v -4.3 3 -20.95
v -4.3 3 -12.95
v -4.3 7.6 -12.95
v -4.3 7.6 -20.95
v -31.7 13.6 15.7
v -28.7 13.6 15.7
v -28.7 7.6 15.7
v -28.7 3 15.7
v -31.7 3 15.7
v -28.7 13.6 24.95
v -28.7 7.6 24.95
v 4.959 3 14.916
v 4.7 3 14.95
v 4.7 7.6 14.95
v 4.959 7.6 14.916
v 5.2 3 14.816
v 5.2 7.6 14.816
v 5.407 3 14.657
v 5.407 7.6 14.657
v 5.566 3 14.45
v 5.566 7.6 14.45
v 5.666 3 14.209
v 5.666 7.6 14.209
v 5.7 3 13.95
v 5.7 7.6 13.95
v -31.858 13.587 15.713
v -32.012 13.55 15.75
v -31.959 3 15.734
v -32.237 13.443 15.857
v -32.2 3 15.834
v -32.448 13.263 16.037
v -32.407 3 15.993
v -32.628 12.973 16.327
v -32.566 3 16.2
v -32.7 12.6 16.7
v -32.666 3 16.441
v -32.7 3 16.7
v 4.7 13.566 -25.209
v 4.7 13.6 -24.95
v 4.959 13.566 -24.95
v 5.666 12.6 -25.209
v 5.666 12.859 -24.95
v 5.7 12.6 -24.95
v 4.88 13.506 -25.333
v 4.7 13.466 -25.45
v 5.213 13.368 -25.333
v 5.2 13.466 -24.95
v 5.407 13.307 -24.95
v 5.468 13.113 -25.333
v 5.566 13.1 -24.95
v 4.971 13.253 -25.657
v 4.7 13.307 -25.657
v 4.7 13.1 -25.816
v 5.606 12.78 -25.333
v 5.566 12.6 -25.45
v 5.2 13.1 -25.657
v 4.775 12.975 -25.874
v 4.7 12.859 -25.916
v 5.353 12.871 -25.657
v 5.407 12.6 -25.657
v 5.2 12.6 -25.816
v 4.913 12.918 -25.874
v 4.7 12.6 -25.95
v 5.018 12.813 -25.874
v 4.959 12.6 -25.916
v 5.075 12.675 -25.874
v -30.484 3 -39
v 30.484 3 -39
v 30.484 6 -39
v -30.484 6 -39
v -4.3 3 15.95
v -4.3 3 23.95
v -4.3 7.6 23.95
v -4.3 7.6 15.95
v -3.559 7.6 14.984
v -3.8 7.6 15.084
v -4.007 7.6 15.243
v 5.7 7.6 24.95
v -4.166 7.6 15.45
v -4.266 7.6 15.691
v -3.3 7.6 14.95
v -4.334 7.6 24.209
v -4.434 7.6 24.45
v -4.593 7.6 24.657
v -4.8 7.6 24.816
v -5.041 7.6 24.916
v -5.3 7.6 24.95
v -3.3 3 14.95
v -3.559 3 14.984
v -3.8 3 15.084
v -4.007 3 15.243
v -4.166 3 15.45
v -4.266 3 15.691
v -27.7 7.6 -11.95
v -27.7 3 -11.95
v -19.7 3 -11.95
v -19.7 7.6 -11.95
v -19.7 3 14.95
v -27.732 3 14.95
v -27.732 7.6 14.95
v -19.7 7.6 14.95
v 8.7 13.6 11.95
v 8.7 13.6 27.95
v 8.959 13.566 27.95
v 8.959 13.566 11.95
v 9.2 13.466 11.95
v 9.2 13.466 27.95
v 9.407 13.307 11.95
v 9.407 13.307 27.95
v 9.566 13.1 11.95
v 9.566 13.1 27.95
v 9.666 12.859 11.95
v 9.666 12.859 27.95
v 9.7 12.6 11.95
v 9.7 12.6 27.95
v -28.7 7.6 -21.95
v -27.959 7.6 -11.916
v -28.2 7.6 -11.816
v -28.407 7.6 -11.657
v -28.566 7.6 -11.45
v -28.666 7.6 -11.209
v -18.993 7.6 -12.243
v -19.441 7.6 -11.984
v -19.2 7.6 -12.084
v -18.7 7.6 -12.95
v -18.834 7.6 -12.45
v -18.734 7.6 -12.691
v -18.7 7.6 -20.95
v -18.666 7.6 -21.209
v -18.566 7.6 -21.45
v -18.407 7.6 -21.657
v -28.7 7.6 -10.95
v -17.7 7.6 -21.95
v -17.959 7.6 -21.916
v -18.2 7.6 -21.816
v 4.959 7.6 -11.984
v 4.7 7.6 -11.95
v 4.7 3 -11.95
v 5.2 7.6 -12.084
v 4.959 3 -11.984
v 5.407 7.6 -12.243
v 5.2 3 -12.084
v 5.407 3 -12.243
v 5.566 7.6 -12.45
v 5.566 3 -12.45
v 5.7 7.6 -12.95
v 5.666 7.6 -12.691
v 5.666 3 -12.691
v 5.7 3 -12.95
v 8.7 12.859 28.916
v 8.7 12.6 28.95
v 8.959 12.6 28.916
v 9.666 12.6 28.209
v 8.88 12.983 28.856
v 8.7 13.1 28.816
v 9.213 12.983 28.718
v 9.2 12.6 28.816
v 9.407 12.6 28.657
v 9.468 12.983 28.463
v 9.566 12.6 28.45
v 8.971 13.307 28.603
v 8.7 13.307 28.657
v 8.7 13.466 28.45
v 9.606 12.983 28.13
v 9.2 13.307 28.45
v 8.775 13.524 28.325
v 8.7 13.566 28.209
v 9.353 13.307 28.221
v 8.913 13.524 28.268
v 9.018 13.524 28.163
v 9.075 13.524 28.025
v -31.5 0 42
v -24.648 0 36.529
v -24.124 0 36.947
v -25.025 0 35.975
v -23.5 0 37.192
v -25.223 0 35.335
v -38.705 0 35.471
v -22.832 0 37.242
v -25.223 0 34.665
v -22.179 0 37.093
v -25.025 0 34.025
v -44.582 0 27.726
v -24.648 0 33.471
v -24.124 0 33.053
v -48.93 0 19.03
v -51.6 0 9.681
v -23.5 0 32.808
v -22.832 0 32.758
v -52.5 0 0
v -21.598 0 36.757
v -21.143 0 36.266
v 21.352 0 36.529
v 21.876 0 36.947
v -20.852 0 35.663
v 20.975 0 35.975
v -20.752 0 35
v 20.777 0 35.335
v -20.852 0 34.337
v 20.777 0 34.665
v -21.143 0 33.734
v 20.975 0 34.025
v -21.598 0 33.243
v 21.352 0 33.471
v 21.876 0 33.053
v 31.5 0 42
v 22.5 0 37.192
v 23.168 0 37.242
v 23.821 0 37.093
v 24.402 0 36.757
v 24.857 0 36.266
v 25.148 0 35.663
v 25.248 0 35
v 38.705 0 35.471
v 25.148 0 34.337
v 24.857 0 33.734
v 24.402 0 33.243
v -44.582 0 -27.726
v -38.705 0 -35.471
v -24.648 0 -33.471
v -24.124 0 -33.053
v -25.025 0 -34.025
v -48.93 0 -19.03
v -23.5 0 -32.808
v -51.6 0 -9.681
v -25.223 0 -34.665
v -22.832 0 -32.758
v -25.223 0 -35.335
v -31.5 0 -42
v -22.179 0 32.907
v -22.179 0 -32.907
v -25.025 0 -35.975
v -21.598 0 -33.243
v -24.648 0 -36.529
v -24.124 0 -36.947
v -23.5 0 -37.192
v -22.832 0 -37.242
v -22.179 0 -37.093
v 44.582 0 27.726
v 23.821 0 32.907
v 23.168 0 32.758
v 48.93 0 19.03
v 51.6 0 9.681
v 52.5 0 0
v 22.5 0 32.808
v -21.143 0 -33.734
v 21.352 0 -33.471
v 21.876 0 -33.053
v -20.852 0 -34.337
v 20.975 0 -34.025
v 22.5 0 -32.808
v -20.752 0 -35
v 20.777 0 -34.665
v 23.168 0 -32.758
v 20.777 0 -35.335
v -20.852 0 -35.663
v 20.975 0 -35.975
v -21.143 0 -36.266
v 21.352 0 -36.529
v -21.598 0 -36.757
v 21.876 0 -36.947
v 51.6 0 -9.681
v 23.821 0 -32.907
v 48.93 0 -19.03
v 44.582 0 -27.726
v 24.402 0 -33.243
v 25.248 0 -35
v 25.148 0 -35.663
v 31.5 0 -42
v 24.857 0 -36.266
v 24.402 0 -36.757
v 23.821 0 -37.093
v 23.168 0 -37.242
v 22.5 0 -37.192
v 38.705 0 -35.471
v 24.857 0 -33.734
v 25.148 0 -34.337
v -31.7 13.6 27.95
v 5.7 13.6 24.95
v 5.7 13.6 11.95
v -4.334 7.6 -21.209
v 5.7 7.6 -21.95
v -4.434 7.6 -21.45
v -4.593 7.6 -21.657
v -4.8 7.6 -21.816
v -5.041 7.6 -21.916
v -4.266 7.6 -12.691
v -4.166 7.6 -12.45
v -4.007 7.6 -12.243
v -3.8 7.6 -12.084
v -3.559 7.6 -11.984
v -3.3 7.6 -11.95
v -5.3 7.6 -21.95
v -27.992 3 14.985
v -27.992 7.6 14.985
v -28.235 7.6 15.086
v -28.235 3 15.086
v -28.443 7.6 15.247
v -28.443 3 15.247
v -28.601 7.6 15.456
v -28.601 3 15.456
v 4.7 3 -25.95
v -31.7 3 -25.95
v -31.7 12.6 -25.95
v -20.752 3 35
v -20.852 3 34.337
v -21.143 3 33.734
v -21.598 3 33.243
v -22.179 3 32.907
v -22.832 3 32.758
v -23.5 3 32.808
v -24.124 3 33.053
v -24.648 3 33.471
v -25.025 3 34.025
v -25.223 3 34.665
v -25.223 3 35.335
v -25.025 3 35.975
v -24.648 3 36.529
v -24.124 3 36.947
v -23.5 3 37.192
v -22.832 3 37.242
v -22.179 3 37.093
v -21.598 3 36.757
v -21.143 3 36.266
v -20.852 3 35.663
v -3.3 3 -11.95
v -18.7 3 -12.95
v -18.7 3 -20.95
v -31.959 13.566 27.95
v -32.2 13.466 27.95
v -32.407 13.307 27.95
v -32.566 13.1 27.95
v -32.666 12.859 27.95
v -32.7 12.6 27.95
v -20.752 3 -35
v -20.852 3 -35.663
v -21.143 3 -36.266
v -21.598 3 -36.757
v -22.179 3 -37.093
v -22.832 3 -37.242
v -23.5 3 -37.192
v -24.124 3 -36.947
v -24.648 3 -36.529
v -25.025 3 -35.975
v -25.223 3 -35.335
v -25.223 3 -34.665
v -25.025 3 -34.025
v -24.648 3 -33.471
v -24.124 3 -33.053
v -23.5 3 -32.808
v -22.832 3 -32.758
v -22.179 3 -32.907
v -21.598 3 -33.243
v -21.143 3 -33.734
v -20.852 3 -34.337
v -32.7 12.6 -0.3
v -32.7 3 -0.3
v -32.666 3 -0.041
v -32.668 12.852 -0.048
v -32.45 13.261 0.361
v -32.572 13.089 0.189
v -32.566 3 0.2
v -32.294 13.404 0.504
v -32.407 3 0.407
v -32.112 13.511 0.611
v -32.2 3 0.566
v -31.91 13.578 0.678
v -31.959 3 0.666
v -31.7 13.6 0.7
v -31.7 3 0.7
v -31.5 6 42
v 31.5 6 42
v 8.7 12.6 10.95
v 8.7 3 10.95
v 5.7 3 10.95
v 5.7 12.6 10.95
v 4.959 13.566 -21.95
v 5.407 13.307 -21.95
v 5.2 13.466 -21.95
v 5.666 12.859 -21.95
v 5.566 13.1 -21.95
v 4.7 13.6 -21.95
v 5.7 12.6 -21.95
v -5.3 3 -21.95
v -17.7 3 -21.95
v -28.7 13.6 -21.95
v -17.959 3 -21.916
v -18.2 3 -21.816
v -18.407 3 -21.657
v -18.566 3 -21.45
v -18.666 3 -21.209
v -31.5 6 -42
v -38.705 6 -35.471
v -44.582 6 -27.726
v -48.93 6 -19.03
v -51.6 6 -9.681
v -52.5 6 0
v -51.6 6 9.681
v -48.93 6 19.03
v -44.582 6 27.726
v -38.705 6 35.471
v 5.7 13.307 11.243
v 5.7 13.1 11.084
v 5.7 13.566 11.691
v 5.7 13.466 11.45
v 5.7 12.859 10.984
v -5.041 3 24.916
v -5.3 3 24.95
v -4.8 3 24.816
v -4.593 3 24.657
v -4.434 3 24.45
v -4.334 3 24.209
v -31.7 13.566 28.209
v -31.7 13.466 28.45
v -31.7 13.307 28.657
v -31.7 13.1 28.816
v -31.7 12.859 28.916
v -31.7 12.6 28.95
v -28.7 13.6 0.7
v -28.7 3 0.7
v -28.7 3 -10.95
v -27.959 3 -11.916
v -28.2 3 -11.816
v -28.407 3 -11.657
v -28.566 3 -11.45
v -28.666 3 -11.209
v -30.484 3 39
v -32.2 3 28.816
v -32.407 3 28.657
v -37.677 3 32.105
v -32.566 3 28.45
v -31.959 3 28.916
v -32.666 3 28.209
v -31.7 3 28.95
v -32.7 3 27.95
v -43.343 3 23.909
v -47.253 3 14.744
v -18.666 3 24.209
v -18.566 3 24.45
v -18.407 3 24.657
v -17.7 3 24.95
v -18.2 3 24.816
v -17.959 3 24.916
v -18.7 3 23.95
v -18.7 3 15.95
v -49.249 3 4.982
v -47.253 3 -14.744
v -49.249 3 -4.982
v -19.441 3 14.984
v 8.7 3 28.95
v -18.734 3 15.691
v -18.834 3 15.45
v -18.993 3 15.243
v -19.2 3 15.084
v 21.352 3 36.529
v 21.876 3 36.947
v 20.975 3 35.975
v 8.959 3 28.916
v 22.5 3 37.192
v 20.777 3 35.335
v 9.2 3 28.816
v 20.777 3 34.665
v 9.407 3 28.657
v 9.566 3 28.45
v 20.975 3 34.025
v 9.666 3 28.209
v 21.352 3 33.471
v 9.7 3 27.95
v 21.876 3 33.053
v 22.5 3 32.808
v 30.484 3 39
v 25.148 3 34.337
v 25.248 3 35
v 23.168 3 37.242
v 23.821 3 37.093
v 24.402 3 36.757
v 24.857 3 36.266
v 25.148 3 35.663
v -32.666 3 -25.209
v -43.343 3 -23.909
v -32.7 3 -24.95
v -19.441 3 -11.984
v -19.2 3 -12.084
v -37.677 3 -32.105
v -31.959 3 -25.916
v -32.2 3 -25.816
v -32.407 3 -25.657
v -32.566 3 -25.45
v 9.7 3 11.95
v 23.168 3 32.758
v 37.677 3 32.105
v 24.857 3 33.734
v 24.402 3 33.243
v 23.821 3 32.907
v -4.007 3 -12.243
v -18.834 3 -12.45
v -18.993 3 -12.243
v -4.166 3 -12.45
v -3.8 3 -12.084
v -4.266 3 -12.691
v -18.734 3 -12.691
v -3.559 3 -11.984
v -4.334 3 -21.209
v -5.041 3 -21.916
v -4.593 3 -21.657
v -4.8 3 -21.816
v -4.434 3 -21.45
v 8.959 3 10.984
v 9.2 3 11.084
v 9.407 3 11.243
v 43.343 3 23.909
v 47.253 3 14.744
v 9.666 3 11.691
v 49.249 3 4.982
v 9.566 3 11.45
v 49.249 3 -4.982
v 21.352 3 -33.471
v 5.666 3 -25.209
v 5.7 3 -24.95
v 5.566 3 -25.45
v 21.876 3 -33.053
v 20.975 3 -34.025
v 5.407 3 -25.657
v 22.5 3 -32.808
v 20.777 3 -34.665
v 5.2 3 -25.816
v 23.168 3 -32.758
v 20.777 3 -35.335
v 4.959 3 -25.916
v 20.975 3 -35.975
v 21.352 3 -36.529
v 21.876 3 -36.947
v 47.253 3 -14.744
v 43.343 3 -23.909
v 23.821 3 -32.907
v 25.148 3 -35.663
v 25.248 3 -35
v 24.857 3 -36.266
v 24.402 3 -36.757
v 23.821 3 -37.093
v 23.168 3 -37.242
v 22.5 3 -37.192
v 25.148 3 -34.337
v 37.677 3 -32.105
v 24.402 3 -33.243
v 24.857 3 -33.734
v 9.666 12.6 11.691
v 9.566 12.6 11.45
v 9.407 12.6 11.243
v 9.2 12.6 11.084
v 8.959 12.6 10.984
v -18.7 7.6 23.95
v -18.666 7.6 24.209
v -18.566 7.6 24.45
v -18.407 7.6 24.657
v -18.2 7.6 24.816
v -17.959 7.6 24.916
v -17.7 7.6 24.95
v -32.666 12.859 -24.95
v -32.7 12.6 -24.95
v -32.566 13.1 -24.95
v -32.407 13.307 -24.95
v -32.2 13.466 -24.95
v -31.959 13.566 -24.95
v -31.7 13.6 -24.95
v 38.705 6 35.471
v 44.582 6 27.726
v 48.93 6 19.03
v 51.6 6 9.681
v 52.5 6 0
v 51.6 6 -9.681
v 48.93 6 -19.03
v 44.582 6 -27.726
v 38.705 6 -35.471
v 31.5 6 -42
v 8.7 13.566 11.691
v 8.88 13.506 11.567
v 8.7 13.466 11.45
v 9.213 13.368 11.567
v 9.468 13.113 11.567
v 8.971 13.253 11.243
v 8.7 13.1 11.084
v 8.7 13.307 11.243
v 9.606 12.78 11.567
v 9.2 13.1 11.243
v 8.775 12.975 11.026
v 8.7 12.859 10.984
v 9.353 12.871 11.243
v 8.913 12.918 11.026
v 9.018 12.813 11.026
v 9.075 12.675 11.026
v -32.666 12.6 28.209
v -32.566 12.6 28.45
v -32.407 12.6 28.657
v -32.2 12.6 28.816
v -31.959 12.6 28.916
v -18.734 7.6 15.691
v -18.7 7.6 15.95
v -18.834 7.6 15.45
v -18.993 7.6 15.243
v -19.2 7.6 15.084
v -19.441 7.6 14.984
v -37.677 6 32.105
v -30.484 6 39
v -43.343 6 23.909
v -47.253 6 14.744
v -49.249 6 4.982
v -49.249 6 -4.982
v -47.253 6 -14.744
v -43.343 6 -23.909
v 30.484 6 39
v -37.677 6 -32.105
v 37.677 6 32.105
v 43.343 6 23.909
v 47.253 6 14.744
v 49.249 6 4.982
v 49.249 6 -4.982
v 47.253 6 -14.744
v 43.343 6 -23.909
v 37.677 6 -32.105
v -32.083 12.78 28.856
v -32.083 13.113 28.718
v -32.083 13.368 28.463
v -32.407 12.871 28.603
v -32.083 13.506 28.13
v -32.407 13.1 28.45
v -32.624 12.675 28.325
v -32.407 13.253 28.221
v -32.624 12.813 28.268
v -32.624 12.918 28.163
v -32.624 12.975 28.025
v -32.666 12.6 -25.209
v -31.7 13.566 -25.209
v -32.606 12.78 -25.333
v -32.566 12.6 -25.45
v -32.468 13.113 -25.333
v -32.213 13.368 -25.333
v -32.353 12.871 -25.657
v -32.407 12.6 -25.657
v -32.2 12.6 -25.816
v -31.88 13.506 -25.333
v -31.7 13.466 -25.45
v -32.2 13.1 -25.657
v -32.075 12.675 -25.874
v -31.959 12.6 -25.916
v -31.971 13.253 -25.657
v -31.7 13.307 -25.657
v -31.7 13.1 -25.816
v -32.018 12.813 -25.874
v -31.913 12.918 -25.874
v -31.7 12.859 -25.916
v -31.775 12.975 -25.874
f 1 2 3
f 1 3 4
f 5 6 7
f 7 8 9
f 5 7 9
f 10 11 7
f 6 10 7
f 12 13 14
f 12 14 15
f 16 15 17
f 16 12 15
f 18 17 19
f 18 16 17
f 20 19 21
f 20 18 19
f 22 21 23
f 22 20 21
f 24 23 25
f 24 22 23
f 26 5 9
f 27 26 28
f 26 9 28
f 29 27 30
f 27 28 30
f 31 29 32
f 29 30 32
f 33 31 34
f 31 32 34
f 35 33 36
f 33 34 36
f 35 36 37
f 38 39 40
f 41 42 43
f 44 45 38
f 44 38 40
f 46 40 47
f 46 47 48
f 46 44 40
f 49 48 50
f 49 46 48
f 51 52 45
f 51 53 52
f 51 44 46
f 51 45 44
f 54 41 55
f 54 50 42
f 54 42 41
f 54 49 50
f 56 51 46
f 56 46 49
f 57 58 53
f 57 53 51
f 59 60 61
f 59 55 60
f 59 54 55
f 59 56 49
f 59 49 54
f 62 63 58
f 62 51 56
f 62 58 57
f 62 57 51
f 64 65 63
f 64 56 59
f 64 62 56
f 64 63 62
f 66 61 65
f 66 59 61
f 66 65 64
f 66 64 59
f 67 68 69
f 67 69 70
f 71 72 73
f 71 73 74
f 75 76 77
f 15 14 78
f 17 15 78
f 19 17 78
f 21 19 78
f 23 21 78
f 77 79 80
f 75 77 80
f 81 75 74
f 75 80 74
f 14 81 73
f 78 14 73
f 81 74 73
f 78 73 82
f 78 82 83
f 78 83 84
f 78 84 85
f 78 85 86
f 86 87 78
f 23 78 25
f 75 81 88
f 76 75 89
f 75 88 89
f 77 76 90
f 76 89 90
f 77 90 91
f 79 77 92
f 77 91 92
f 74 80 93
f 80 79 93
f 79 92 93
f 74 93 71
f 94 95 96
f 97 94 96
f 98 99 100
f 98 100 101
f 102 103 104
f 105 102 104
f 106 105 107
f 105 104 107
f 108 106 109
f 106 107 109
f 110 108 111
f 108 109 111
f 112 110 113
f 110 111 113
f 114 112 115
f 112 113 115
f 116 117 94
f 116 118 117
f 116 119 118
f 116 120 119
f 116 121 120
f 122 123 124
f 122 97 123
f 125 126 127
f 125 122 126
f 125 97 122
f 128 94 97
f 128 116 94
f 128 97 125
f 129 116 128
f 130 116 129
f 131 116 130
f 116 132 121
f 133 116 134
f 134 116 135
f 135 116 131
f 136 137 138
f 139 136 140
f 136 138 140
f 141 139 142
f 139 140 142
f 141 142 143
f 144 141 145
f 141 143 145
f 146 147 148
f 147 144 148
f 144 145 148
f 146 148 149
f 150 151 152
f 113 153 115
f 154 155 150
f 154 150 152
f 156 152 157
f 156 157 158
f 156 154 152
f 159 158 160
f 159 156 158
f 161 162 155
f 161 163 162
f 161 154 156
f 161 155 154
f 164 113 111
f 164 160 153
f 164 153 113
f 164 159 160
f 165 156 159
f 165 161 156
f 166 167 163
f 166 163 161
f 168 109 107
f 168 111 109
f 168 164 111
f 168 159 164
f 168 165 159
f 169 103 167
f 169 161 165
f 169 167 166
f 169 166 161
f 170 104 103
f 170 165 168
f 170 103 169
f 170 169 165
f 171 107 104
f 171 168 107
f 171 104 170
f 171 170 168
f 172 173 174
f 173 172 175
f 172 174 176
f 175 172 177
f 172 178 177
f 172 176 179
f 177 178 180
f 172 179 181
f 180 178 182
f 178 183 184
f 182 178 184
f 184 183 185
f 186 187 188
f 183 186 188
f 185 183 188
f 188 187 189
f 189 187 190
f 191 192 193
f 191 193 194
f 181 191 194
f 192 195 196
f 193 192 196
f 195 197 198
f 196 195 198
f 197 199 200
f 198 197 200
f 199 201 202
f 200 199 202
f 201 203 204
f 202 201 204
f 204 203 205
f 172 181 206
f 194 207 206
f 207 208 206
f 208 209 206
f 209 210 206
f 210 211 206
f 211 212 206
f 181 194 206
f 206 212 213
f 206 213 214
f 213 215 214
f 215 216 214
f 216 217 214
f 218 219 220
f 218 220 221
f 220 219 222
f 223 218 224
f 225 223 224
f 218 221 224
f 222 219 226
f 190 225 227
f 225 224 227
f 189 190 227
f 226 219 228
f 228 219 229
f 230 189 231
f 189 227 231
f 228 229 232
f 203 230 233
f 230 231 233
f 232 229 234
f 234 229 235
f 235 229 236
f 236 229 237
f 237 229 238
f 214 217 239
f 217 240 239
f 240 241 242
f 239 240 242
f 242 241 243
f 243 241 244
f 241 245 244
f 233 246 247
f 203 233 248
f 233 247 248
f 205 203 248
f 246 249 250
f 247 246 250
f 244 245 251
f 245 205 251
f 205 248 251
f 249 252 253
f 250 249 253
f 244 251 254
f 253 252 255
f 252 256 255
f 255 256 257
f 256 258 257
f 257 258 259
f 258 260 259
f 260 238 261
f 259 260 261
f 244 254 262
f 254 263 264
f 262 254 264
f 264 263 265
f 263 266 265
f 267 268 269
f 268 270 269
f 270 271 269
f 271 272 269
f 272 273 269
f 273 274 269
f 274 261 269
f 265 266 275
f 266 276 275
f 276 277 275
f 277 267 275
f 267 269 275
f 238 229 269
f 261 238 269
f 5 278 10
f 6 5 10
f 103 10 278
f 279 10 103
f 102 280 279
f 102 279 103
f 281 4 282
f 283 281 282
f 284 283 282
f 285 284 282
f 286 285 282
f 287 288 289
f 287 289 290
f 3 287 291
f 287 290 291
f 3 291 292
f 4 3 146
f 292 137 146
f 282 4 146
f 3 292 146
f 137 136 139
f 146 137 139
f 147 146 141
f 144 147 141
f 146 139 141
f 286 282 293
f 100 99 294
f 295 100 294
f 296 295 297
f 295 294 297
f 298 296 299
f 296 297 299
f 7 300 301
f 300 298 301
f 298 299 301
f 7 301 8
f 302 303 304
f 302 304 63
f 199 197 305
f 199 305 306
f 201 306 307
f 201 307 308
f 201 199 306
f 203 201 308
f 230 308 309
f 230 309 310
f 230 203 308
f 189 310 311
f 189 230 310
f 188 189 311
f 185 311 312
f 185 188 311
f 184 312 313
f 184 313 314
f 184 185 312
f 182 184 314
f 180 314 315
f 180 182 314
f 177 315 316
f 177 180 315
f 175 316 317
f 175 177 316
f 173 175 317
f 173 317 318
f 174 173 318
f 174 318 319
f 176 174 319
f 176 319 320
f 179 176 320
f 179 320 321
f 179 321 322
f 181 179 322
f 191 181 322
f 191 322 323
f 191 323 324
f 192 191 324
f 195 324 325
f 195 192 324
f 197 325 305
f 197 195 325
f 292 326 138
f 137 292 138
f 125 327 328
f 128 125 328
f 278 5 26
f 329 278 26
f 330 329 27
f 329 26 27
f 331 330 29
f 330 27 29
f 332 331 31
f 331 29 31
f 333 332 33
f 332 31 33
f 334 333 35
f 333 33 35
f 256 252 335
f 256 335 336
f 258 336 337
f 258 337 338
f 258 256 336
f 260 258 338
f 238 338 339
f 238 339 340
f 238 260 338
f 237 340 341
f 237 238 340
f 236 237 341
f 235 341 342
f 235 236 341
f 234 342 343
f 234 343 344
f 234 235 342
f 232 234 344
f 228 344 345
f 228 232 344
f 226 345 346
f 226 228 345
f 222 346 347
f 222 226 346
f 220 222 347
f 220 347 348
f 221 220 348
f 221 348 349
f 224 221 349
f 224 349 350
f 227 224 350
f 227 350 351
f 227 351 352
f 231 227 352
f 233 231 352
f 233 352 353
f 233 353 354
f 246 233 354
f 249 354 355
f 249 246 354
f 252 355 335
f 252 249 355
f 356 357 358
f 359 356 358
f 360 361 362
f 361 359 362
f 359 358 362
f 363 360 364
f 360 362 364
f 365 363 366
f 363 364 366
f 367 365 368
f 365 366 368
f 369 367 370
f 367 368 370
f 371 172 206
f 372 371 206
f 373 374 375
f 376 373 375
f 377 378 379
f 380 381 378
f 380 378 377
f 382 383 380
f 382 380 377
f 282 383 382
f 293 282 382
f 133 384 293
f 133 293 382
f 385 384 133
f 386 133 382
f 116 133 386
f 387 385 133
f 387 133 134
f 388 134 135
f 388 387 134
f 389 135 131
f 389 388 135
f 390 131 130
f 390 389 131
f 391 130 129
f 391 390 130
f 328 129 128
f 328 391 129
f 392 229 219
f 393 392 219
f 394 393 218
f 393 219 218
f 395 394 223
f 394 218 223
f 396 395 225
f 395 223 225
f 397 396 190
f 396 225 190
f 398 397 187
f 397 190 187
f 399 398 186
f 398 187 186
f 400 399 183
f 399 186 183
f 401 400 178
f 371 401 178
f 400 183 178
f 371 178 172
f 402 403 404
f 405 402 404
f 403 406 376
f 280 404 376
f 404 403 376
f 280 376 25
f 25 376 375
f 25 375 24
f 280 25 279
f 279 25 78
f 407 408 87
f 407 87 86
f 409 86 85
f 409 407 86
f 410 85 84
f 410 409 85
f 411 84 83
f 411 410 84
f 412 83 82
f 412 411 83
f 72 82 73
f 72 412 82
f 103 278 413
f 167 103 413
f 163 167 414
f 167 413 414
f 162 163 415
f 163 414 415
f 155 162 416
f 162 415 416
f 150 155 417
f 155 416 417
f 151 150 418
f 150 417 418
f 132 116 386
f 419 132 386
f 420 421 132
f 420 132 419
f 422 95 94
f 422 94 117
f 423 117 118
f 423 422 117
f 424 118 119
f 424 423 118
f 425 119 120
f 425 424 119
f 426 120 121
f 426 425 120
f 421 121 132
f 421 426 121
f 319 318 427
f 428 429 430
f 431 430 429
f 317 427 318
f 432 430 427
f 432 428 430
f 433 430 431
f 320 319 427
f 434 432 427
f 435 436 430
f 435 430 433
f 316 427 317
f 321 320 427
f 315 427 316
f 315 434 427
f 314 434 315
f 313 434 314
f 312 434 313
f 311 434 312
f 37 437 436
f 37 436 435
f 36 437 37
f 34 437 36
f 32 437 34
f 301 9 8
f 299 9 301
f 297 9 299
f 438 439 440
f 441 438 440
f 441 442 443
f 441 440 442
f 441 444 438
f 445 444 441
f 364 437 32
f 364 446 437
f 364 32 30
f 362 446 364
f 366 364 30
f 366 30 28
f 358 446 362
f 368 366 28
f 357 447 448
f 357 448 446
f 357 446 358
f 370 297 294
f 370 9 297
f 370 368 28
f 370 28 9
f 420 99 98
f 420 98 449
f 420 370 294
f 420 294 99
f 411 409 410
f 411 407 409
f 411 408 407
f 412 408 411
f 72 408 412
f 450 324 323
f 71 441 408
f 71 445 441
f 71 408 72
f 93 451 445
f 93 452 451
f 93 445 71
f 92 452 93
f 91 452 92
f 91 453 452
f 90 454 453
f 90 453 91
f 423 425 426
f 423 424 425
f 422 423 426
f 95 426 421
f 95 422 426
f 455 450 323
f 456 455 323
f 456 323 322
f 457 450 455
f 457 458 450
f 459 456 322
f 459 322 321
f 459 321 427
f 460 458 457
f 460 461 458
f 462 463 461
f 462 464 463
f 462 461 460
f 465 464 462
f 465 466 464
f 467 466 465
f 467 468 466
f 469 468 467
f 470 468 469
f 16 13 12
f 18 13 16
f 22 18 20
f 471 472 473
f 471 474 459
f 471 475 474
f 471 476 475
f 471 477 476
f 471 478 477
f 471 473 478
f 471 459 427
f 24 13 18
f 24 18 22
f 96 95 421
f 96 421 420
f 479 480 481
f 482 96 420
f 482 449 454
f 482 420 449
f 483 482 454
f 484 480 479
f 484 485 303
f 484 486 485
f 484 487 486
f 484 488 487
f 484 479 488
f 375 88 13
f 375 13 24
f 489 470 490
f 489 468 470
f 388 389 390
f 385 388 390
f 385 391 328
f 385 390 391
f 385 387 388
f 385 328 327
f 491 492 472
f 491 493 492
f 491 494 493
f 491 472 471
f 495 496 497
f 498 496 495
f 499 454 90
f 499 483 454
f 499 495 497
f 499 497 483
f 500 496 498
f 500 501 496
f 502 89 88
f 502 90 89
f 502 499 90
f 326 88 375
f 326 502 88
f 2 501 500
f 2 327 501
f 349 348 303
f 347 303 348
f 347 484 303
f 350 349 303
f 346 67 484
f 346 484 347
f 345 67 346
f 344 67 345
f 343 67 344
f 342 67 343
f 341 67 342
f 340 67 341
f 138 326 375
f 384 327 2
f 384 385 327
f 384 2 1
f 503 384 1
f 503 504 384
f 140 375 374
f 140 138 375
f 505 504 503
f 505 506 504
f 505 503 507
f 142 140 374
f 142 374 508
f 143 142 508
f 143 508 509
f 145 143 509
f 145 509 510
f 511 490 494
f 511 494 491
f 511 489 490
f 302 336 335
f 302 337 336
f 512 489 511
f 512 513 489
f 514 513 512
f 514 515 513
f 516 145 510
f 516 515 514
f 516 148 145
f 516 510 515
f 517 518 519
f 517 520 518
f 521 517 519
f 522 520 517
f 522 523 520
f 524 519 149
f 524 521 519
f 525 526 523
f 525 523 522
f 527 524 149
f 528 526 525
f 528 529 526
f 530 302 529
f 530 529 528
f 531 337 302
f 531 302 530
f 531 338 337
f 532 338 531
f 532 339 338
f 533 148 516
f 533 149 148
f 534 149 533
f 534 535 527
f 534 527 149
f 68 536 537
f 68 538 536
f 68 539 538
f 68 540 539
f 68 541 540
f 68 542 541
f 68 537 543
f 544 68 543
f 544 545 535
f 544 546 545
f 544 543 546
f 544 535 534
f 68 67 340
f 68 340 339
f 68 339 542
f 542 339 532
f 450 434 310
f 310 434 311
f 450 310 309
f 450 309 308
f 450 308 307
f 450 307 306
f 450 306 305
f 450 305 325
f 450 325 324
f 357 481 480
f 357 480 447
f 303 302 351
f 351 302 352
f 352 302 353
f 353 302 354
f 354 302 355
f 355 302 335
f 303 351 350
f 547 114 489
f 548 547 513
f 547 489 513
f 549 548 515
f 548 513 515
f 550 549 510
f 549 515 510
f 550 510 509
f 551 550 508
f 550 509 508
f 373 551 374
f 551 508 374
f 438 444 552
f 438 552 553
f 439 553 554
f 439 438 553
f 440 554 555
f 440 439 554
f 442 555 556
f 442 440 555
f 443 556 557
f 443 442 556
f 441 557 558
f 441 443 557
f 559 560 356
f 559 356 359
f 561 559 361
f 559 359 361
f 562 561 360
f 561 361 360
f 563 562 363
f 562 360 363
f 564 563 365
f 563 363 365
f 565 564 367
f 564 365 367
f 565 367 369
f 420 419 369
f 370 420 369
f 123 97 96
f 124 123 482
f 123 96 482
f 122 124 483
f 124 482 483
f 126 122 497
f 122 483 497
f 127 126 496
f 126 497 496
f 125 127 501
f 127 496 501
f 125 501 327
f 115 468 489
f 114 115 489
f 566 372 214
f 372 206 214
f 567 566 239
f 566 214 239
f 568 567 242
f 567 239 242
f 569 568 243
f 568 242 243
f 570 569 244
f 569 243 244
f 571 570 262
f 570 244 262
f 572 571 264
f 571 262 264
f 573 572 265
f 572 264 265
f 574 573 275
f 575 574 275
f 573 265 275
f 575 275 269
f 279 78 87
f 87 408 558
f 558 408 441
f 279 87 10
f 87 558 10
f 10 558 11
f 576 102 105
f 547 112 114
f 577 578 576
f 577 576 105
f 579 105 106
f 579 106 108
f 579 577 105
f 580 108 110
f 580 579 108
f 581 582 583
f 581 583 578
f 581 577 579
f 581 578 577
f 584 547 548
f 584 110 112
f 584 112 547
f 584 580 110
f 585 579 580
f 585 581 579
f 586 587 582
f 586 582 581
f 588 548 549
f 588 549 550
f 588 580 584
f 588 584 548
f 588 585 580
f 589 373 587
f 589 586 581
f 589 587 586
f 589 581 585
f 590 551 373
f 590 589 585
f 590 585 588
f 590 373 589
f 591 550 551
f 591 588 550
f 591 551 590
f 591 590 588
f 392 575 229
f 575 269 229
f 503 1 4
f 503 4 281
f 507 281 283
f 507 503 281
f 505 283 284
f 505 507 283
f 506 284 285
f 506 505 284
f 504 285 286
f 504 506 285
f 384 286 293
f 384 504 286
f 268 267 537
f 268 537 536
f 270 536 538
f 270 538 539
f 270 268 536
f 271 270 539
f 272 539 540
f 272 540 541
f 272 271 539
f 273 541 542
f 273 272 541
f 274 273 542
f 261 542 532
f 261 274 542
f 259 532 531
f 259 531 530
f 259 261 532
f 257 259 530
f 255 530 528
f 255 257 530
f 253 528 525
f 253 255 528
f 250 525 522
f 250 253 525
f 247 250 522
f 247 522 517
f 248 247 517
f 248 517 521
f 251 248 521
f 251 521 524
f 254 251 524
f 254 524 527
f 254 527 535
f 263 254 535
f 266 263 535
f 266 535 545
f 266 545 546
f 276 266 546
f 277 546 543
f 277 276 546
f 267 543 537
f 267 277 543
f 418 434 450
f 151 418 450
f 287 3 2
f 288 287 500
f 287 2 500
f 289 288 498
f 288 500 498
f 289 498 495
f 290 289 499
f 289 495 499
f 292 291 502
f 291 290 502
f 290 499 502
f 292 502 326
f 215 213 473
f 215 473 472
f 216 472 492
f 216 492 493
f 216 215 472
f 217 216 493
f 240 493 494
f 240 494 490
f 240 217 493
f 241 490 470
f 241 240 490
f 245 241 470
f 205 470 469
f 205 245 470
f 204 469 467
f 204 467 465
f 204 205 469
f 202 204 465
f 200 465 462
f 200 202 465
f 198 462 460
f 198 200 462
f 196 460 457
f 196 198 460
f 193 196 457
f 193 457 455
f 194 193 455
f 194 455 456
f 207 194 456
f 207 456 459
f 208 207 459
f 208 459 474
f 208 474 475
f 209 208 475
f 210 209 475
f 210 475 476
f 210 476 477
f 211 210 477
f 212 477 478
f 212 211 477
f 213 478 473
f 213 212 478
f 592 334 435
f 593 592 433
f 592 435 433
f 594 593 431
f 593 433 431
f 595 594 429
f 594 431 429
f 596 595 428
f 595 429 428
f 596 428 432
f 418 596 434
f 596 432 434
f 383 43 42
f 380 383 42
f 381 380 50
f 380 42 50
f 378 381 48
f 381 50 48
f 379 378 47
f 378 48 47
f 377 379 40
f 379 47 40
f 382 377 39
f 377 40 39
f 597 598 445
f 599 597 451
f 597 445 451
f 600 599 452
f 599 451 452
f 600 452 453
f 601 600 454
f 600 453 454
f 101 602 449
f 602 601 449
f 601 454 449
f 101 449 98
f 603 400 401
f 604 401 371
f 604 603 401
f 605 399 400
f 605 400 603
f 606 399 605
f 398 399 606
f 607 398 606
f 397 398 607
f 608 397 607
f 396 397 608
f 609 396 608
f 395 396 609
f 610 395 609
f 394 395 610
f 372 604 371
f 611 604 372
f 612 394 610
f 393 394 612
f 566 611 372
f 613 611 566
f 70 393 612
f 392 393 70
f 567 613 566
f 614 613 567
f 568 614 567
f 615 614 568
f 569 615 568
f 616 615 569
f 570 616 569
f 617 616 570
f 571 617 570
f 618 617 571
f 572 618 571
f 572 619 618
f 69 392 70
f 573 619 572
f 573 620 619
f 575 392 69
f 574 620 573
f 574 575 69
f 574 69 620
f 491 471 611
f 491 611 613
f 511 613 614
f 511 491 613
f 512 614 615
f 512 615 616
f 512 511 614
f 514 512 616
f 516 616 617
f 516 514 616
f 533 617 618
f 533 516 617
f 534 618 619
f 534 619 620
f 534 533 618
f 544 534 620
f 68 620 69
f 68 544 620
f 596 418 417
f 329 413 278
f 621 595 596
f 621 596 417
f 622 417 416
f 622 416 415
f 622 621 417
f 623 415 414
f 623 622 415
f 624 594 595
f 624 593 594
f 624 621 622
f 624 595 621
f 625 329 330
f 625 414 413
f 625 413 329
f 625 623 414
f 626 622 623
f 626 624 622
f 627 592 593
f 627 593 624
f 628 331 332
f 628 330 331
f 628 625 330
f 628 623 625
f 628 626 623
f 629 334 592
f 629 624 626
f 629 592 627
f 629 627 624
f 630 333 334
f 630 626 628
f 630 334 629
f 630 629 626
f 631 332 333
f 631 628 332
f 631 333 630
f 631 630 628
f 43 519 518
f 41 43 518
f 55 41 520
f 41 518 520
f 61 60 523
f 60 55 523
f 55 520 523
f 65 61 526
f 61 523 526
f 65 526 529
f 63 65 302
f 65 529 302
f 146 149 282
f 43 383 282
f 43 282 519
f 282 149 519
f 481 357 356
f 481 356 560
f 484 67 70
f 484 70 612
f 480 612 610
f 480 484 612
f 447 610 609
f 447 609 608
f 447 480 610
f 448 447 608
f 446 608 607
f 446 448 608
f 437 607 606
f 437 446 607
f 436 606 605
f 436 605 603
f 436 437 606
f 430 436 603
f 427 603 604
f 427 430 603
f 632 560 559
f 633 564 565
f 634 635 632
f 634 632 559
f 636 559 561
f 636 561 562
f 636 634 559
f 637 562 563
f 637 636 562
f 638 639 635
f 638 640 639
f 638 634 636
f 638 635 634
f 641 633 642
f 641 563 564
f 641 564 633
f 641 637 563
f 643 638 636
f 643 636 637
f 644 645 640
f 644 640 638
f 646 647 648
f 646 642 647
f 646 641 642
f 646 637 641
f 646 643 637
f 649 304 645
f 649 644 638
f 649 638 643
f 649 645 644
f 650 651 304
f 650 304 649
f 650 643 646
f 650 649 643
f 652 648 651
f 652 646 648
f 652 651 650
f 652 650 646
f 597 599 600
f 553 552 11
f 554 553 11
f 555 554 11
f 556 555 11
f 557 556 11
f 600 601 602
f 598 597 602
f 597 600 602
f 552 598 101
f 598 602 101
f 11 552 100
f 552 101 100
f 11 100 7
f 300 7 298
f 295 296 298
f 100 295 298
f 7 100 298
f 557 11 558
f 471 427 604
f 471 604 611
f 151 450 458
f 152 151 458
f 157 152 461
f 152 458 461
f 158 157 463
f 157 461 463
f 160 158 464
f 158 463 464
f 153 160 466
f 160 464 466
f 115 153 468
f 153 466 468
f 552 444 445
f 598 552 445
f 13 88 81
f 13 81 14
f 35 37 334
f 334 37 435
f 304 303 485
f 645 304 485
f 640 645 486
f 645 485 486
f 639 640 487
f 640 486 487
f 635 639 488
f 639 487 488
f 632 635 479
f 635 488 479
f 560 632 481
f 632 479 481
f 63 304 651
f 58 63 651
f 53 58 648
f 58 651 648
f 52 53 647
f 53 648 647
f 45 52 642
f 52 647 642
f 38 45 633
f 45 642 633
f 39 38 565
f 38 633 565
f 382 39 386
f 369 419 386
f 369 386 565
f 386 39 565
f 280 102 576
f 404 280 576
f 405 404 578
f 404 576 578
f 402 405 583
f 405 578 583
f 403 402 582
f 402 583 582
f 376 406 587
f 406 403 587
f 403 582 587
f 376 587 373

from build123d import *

# Parameters (mm, degrees)
A_BASE_T42_OUTLINE_R       = 2.2479
A_BASE_T42_OUTLINE_R_2     = 1
A_BASE_T42_DEPTH           = 3
OUTER_BRIM_DEPTH           = 3
SKETCH5_W                  = 3
SKETCH5_H                  = 15
SKETCH5_W_2                = 15
SKETCH5_H_2                = 3
BASE_SUPPORTS_DEPTH        = 3
BASE_SUPPORTS_CHAMFER_SIZE = 3
COVER_START                = -3
SKETCH6_R                  = 1
COVER_DEPTH                = 3
SKETCH9_W                  = 15
SKETCH9_H                  = 6
SKETCH9_W_2                = 6
SKETCH9_H_2                = 15
CUT_EXTRUDE1_DEPTH         = 10
SKETCH10_W                 = 10
SKETCH10_H                 = 10
BOSS_EXTRUDE1_DEPTH        = 4.6
BOSS_EXTRUDE2_DEPTH        = 10.6
FILLET1_R                  = 1


with BuildPart() as part:
    # a_base_t42: read off the stored shape, not the designer's step
    # a_base_t42 outline → a_base_t42 (new body)
    with BuildSketch(Plane(origin=(0, 0, 0), x_dir=(1, 0, 0), z_dir=(0, 1, 0))):
        with BuildLine():
            ThreePointArc((31.5, -42), (52.5, 0), (31.5, 42))
            Line((31.5, 42), (-31.5, 42))
            ThreePointArc((-31.5, 42), (-52.5, 0), (-31.5, -42))
            Line((-31.5, -42), (31.5, -42))
        make_face()
        with Locations((-23, -35)):
            Circle(A_BASE_T42_OUTLINE_R, mode=Mode.SUBTRACT)
        with Locations((23, -35)):
            Circle(A_BASE_T42_OUTLINE_R, mode=Mode.SUBTRACT)
        with Locations((-40.25, 0)):
            Circle(A_BASE_T42_OUTLINE_R_2, mode=Mode.SUBTRACT)
        with Locations((-23, 35)):
            Circle(A_BASE_T42_OUTLINE_R, mode=Mode.SUBTRACT)
        with Locations((40.25, 0)):
            Circle(A_BASE_T42_OUTLINE_R_2, mode=Mode.SUBTRACT)
        with Locations((23, 35)):
            Circle(A_BASE_T42_OUTLINE_R, mode=Mode.SUBTRACT)
    extrude(amount=A_BASE_T42_DEPTH)

    # Sketch1 → Outer Brim (add)
    with BuildSketch(Plane(origin=(0, 3, 0), x_dir=(1, 0, 0), z_dir=(0, 1, 0))):
        with BuildLine():
            Line((-31.5, -42), (31.5, -42))
            ThreePointArc((31.5, -42), (52.5, 0), (31.5, 42))
            Line((31.5, 42), (-31.5, 42))
            ThreePointArc((-31.5, 42), (-52.5, 0), (-31.5, -42))
        make_face()
        with BuildLine():
            Line((30.483602149, 39), (-30.483602149, 39))
            ThreePointArc((-30.483602149, 39), (-49.5, 0), (-30.483602149, -39))
            Line((-30.483602149, -39), (30.483602149, -39))
            ThreePointArc((30.483602149, -39), (49.5, 0), (30.483602149, 39))
        make_face(mode=Mode.SUBTRACT)
    extrude(amount=OUTER_BRIM_DEPTH)

    # Sketch5 → Base Supports (add)
    with BuildSketch(Plane(origin=(0, 3, 0), x_dir=(1, 0, 0), z_dir=(0, 1, 0))):
        with Locations((-34.325, -12.5)):
            Rectangle(SKETCH5_W, SKETCH5_H)
        with Locations((-34.325, 12.5)):
            Rectangle(SKETCH5_W, SKETCH5_H)
        with Locations((-25.325, -27)):
            Rectangle(SKETCH5_W_2, SKETCH5_H_2)
        with Locations((-25.325, 27)):
            Rectangle(SKETCH5_W_2, SKETCH5_H_2)
    extrude(amount=BASE_SUPPORTS_DEPTH)

    # Base Supports Chamfer
    base_supports_chamfer_edges = [part.edges().sort_by_distance(p)[0] for p in [
        (-25.325, 3, 28.5),
        (-25.325, 3, -28.5),
        (-35.825, 3, 12.5),
        (-35.825, 3, -12.5),
    ]]
    chamfer(base_supports_chamfer_edges, length=BASE_SUPPORTS_CHAMFER_SIZE - 0.0001)  # a hair under: the kernel refuses the full size

    # Sketch6 → Cover (add)
    with BuildSketch(Plane(origin=(0, 3, 0), x_dir=(1, 0, 0), z_dir=(0, 1, 0)).offset(COVER_START)):
        with Locations((-40.25, 0)):
            Circle(SKETCH6_R)
        with Locations((40.25, 0)):
            Circle(SKETCH6_R)
    extrude(amount=COVER_DEPTH)

    # Sketch9 → Cut-Extrude1 (cut)
    with BuildSketch(Plane(origin=(0, 3, 0), x_dir=(1, 0, 0), z_dir=(0, 1, 0))):
        with Locations((-25.325, 28.5)):
            Rectangle(SKETCH9_W, SKETCH9_H)
        with Locations((-35.825, 12.5)):
            Rectangle(SKETCH9_W_2, SKETCH9_H_2)
        with Locations((-35.825, -12.5)):
            Rectangle(SKETCH9_W_2, SKETCH9_H_2)
        with Locations((-25.325, -28.5)):
            Rectangle(SKETCH9_W, SKETCH9_H)
    extrude(amount=CUT_EXTRUDE1_DEPTH, mode=Mode.SUBTRACT)

    # Sketch10 → Boss-Extrude1 (add)
    with BuildSketch(Plane(origin=(0, 3, 0), x_dir=(1, 0, 0), z_dir=(0, 1, 0))):
        with Locations((-23.7, 16.95)):
            Rectangle(SKETCH10_W, SKETCH10_H)
        with Locations((0.7, 16.95)):
            Rectangle(SKETCH10_W, SKETCH10_H)
        with Locations((0.7, -19.95)):
            Rectangle(SKETCH10_W, SKETCH10_H)
        with Locations((-23.7, -19.95)):
            Rectangle(SKETCH10_W, SKETCH10_H)
    extrude(amount=BOSS_EXTRUDE1_DEPTH)

    # Sketch11 → Boss-Extrude2 (add)
    with BuildSketch(Plane(origin=(0, 3, 0), x_dir=(1, 0, 0), z_dir=(0, 1, 0))):
        Polygon((-28.7, 21.95), (-28.7, -0.7), (-32.7, -0.7), (-32.7, 25.95), (5.7, 25.95), (5.7, 21.95), align=None)
        Polygon((-28.7, -24.95), (-28.7, -15.7), (-32.7, -15.7), (-32.7, -28.95), (9.7, -28.95), (9.7, -10.95), (5.7, -10.95), (5.7, -24.95), align=None)
    extrude(amount=BOSS_EXTRUDE2_DEPTH)

    # Fillet1
    # the kernel refuses this fillet: 1 mm, written as the material it adds along each edge
    with BuildSketch(Plane(origin=(-18.7, 0.5, 24.95), x_dir=(1, 0, 0), z_dir=(0, 1, 0)), Plane(origin=(-4.3, 0.5, 24.95), x_dir=(0, 0, -1), z_dir=(0, 1, 0)), Plane(origin=(5.7, 0.5, 14.95), x_dir=(0, 0, -1), z_dir=(0, 1, 0)), Plane(origin=(-4.3, 0.5, -21.95), x_dir=(-1, 0, 0), z_dir=(0, 1, 0)), Plane(origin=(-18.7, 0.5, -21.95), x_dir=(0, 0, 1), z_dir=(0, 1, 0)), Plane(origin=(-28.7, 0.5, -11.95), x_dir=(0, 0, 1), z_dir=(0, 1, 0))) as fillet1_piece_1:
        with BuildLine():
            CenterArc((FILLET1_R, FILLET1_R), FILLET1_R, 180, 90)
            Line((0, FILLET1_R), (0, 0))
            Line((0, 0), (FILLET1_R, 0))
        make_face()
    extrude(amount=7.1)
    # the kernel refuses this fillet: 1 mm, written as the material it takes off along each edge
    with BuildSketch(Plane(origin=(-31.7, 12.6, 27.95), x_dir=(0, 1, 0), z_dir=(-1, 0, 0))) as fillet1_2_piece_1_section:
        Polygon((0, 0), (FILLET1_R * 1.02, 0), (FILLET1_R * 1.02, -FILLET1_R * 1.02), (0, -FILLET1_R * 1.02), align=None)
    fillet1_2_piece_1 = extrude(amount=FILLET1_R * 1.02, mode=Mode.PRIVATE)
    fillet1_2_piece_1 = fillet1_2_piece_1 - Plane(origin=(-31.7, 12.6, 27.95), x_dir=(0, -0.7071067811865475, -0.7071067811865475), z_dir=(-1, 0, 0)) * Sphere(FILLET1_R, mode=Mode.PRIVATE)
    add(fillet1_2_piece_1, mode=Mode.SUBTRACT)
    with BuildSketch(Plane(origin=(8.7, 12.6, 27.95), x_dir=(1, 0, 0), z_dir=(0, 1, 0))) as fillet1_2_piece_2_section:
        Polygon((0, 0), (FILLET1_R * 1.02, 0), (FILLET1_R * 1.02, -FILLET1_R * 1.02), (0, -FILLET1_R * 1.02), align=None)
    fillet1_2_piece_2 = extrude(amount=FILLET1_R * 1.02, mode=Mode.PRIVATE)
    fillet1_2_piece_2 = fillet1_2_piece_2 - Plane(origin=(8.7, 12.6, 27.95), x_dir=(-0.7071067811865475, 0, -0.7071067811865475), z_dir=(0, 1, 0)) * Sphere(FILLET1_R, mode=Mode.PRIVATE)
    add(fillet1_2_piece_2, mode=Mode.SUBTRACT)
    with BuildSketch(Plane(origin=(8.7, 12.6, 11.95), x_dir=(0, 1, 0), z_dir=(0, 0, -1))) as fillet1_2_piece_3_section:
        Polygon((0, 0), (FILLET1_R * 1.02, 0), (FILLET1_R * 1.02, FILLET1_R * 1.02), (0, FILLET1_R * 1.02), align=None)
    fillet1_2_piece_3 = extrude(amount=FILLET1_R * 1.02, mode=Mode.PRIVATE)
    fillet1_2_piece_3 = fillet1_2_piece_3 - Plane(origin=(8.7, 12.6, 11.95), x_dir=(-0.7071067811865475, -0.7071067811865475, 0), z_dir=(0, 0, -1)) * Sphere(FILLET1_R, mode=Mode.PRIVATE)
    add(fillet1_2_piece_3, mode=Mode.SUBTRACT)
    with BuildSketch(Plane(origin=(4.7, 12.6, -24.95), x_dir=(1, 0, 0), z_dir=(0, 0, -1))) as fillet1_2_piece_4_section:
        Polygon((0, 0), (FILLET1_R * 1.02, 0), (FILLET1_R * 1.02, -FILLET1_R * 1.02), (0, -FILLET1_R * 1.02), align=None)
    fillet1_2_piece_4 = extrude(amount=FILLET1_R * 1.02, mode=Mode.PRIVATE)
    fillet1_2_piece_4 = fillet1_2_piece_4 - Plane(origin=(4.7, 12.6, -24.95), x_dir=(-0.7071067811865475, -0.7071067811865475, 0), z_dir=(0, 0, -1)) * Sphere(FILLET1_R, mode=Mode.PRIVATE)
    add(fillet1_2_piece_4, mode=Mode.SUBTRACT)
    with BuildSketch(Plane(origin=(-31.7, 12.6, -24.95), x_dir=(0, 1, 0), z_dir=(0, 0, -1))) as fillet1_2_piece_5_section:
        Polygon((0, 0), (FILLET1_R * 1.02, 0), (FILLET1_R * 1.02, -FILLET1_R * 1.02), (0, -FILLET1_R * 1.02), align=None)
    fillet1_2_piece_5 = extrude(amount=FILLET1_R * 1.02, mode=Mode.PRIVATE)
    fillet1_2_piece_5 = fillet1_2_piece_5 - Plane(origin=(-31.7, 12.6, -24.95), x_dir=(0.7071067811865475, -0.7071067811865475, 0), z_dir=(0, 0, -1)) * Sphere(FILLET1_R, mode=Mode.PRIVATE)
    add(fillet1_2_piece_5, mode=Mode.SUBTRACT)
    with BuildSketch(Plane(origin=(-32.7, 13.6, 13.2), x_dir=(1, 0, 0), z_dir=(0, 0, 1))) as fillet1_2_piece_6:
        with BuildLine():
            CenterArc((FILLET1_R, -FILLET1_R), FILLET1_R, 90, 90)
            Line((0, -FILLET1_R), (0, 0))
            Line((0, 0), (FILLET1_R, 0))
        make_face()
    extrude(amount=14.75, mode=Mode.SUBTRACT)
    with BuildSketch(Plane(origin=(-31.7, 13.6, 28.95), x_dir=(0, 0, -1), z_dir=(1, 0, 0))) as fillet1_2_piece_7:
        with BuildLine():
            CenterArc((FILLET1_R, -FILLET1_R), FILLET1_R, 90, 90)
            Line((0, -FILLET1_R), (0, 0))
            Line((0, 0), (FILLET1_R, 0))
        make_face()
    extrude(amount=40.4, mode=Mode.SUBTRACT)
    with BuildSketch(Plane(origin=(9.7, 13.6, 27.95), x_dir=(-1, 0, 0), z_dir=(0, 0, -1))) as fillet1_2_piece_8:
        with BuildLine():
            CenterArc((FILLET1_R, -FILLET1_R), FILLET1_R, 90, 90)
            Line((0, -FILLET1_R), (0, 0))
            Line((0, 0), (FILLET1_R, 0))
        make_face()
    extrude(amount=16, mode=Mode.SUBTRACT)
    with BuildSketch(Plane(origin=(5.7, 13.6, -24.95), x_dir=(-1, 0, 0), z_dir=(0, 0, 1))) as fillet1_2_piece_9:
        with BuildLine():
            CenterArc((FILLET1_R, FILLET1_R), FILLET1_R, 180, 90)
            Line((0, FILLET1_R), (0, 0))
            Line((0, 0), (FILLET1_R, 0))
        make_face()
    extrude(amount=5.5, mode=Mode.SUBTRACT)
    with BuildSketch(Plane(origin=(-31.7, 13.6, -25.95), x_dir=(0, 0, 1), z_dir=(1, 0, 0))) as fillet1_2_piece_10:
        with BuildLine():
            CenterArc((FILLET1_R, FILLET1_R), FILLET1_R, 180, 90)
            Line((0, FILLET1_R), (0, 0))
            Line((0, 0), (FILLET1_R, 0))
        make_face()
    extrude(amount=36.4, mode=Mode.SUBTRACT)
    with BuildSketch(Plane(origin=(-32.7, 13.6, 3.2), x_dir=(1, 0, 0), z_dir=(0, 0, -1))) as fillet1_2_piece_11:
        with BuildLine():
            CenterArc((FILLET1_R, FILLET1_R), FILLET1_R, 180, 90)
            Line((0, FILLET1_R), (0, 0))
            Line((0, 0), (FILLET1_R, 0))
        make_face()
    extrude(amount=28.15, mode=Mode.SUBTRACT)
    with BuildSketch(Plane(origin=(-32.7, 3, 0.7), x_dir=(1, 0, 0), z_dir=(0, 1, 0)), Plane(origin=(-32.7, 3, 15.7), x_dir=(0, 0, 1), z_dir=(0, 1, 0))) as fillet1_2_piece_12:
        with BuildLine():
            CenterArc((FILLET1_R, FILLET1_R), FILLET1_R, 180, 90)
            Line((0, FILLET1_R), (0, 0))
            Line((0, 0), (FILLET1_R, 0))
        make_face()
    extrude(amount=13.1, mode=Mode.SUBTRACT)
    with BuildSketch(Plane(origin=(-32.7, 3, -25.95), x_dir=(0, 0, 1), z_dir=(0, 1, 0)), Plane(origin=(5.7, 3, -25.95), x_dir=(-1, 0, 0), z_dir=(0, 1, 0)), Plane(origin=(9.7, 3, 10.95), x_dir=(-1, 0, 0), z_dir=(0, 1, 0)), Plane(origin=(9.7, 3, 28.95), x_dir=(0, 0, -1), z_dir=(0, 1, 0)), Plane(origin=(-32.7, 3, 28.95), x_dir=(1, 0, 0), z_dir=(0, 1, 0))) as fillet1_2_piece_13:
        with BuildLine():
            CenterArc((FILLET1_R, FILLET1_R), FILLET1_R, 180, 90)
            Line((0, FILLET1_R), (0, 0))
            Line((0, 0), (FILLET1_R, 0))
        make_face()
    extrude(amount=9.6, mode=Mode.SUBTRACT)
    with BuildSketch(Plane(origin=(-28.7, 3, 14.95), x_dir=(0, 0, 1), z_dir=(0, 1, 0))) as fillet1_2_piece_14:
        with BuildLine():
            CenterArc((1, 0.968245837), FILLET1_R, 180, 75.522487814)
            Line((0, 0.968245837), (0, 0))
            Line((0, 0), (0.75, 0))
        make_face()
    extrude(amount=7.020614591, mode=Mode.SUBTRACT)
    with BuildSketch(Plane(origin=(-18.7, 3, 14.95), x_dir=(-1, 0, 0), z_dir=(0, 1, 0)), Plane(origin=(-4.3, 3, 14.95), x_dir=(0, 0, 1), z_dir=(0, 1, 0)), Plane(origin=(5.7, 3, -11.95), x_dir=(0, 0, -1), z_dir=(0, 1, 0)), Plane(origin=(-4.3, 3, -11.95), x_dir=(1, 0, 0), z_dir=(0, 1, 0))) as fillet1_2_piece_15:
        with BuildLine():
            CenterArc((FILLET1_R, FILLET1_R), FILLET1_R, 180, 90)
            Line((0, FILLET1_R), (0, 0))
            Line((0, 0), (FILLET1_R, 0))
        make_face()
    extrude(amount=7.1, mode=Mode.SUBTRACT)
    with BuildSketch(Plane(origin=(-18.7, 3, -11.95), x_dir=(-1, 0, 0), z_dir=(0, 1, 0))) as fillet1_2_piece_16:
        with BuildLine():
            CenterArc((FILLET1_R, -FILLET1_R), FILLET1_R, 90, 90)
            Line((0, -FILLET1_R), (0, 0))
            Line((0, 0), (FILLET1_R, 0))
        make_face()
    extrude(amount=7.1, mode=Mode.SUBTRACT)
    with BuildSketch(Plane(origin=(8.7, 13.6, 10.95), x_dir=(0, 0, 1), z_dir=(-1, 0, 0))) as fillet1_2_piece_17:
        with BuildLine():
            CenterArc((FILLET1_R, -FILLET1_R), FILLET1_R, 90, 90)
            Line((0, -FILLET1_R), (0, 0))
            Line((0, 0), (FILLET1_R, 0))
        make_face()
    extrude(amount=5.5, mode=Mode.SUBTRACT)


solid = part.part
